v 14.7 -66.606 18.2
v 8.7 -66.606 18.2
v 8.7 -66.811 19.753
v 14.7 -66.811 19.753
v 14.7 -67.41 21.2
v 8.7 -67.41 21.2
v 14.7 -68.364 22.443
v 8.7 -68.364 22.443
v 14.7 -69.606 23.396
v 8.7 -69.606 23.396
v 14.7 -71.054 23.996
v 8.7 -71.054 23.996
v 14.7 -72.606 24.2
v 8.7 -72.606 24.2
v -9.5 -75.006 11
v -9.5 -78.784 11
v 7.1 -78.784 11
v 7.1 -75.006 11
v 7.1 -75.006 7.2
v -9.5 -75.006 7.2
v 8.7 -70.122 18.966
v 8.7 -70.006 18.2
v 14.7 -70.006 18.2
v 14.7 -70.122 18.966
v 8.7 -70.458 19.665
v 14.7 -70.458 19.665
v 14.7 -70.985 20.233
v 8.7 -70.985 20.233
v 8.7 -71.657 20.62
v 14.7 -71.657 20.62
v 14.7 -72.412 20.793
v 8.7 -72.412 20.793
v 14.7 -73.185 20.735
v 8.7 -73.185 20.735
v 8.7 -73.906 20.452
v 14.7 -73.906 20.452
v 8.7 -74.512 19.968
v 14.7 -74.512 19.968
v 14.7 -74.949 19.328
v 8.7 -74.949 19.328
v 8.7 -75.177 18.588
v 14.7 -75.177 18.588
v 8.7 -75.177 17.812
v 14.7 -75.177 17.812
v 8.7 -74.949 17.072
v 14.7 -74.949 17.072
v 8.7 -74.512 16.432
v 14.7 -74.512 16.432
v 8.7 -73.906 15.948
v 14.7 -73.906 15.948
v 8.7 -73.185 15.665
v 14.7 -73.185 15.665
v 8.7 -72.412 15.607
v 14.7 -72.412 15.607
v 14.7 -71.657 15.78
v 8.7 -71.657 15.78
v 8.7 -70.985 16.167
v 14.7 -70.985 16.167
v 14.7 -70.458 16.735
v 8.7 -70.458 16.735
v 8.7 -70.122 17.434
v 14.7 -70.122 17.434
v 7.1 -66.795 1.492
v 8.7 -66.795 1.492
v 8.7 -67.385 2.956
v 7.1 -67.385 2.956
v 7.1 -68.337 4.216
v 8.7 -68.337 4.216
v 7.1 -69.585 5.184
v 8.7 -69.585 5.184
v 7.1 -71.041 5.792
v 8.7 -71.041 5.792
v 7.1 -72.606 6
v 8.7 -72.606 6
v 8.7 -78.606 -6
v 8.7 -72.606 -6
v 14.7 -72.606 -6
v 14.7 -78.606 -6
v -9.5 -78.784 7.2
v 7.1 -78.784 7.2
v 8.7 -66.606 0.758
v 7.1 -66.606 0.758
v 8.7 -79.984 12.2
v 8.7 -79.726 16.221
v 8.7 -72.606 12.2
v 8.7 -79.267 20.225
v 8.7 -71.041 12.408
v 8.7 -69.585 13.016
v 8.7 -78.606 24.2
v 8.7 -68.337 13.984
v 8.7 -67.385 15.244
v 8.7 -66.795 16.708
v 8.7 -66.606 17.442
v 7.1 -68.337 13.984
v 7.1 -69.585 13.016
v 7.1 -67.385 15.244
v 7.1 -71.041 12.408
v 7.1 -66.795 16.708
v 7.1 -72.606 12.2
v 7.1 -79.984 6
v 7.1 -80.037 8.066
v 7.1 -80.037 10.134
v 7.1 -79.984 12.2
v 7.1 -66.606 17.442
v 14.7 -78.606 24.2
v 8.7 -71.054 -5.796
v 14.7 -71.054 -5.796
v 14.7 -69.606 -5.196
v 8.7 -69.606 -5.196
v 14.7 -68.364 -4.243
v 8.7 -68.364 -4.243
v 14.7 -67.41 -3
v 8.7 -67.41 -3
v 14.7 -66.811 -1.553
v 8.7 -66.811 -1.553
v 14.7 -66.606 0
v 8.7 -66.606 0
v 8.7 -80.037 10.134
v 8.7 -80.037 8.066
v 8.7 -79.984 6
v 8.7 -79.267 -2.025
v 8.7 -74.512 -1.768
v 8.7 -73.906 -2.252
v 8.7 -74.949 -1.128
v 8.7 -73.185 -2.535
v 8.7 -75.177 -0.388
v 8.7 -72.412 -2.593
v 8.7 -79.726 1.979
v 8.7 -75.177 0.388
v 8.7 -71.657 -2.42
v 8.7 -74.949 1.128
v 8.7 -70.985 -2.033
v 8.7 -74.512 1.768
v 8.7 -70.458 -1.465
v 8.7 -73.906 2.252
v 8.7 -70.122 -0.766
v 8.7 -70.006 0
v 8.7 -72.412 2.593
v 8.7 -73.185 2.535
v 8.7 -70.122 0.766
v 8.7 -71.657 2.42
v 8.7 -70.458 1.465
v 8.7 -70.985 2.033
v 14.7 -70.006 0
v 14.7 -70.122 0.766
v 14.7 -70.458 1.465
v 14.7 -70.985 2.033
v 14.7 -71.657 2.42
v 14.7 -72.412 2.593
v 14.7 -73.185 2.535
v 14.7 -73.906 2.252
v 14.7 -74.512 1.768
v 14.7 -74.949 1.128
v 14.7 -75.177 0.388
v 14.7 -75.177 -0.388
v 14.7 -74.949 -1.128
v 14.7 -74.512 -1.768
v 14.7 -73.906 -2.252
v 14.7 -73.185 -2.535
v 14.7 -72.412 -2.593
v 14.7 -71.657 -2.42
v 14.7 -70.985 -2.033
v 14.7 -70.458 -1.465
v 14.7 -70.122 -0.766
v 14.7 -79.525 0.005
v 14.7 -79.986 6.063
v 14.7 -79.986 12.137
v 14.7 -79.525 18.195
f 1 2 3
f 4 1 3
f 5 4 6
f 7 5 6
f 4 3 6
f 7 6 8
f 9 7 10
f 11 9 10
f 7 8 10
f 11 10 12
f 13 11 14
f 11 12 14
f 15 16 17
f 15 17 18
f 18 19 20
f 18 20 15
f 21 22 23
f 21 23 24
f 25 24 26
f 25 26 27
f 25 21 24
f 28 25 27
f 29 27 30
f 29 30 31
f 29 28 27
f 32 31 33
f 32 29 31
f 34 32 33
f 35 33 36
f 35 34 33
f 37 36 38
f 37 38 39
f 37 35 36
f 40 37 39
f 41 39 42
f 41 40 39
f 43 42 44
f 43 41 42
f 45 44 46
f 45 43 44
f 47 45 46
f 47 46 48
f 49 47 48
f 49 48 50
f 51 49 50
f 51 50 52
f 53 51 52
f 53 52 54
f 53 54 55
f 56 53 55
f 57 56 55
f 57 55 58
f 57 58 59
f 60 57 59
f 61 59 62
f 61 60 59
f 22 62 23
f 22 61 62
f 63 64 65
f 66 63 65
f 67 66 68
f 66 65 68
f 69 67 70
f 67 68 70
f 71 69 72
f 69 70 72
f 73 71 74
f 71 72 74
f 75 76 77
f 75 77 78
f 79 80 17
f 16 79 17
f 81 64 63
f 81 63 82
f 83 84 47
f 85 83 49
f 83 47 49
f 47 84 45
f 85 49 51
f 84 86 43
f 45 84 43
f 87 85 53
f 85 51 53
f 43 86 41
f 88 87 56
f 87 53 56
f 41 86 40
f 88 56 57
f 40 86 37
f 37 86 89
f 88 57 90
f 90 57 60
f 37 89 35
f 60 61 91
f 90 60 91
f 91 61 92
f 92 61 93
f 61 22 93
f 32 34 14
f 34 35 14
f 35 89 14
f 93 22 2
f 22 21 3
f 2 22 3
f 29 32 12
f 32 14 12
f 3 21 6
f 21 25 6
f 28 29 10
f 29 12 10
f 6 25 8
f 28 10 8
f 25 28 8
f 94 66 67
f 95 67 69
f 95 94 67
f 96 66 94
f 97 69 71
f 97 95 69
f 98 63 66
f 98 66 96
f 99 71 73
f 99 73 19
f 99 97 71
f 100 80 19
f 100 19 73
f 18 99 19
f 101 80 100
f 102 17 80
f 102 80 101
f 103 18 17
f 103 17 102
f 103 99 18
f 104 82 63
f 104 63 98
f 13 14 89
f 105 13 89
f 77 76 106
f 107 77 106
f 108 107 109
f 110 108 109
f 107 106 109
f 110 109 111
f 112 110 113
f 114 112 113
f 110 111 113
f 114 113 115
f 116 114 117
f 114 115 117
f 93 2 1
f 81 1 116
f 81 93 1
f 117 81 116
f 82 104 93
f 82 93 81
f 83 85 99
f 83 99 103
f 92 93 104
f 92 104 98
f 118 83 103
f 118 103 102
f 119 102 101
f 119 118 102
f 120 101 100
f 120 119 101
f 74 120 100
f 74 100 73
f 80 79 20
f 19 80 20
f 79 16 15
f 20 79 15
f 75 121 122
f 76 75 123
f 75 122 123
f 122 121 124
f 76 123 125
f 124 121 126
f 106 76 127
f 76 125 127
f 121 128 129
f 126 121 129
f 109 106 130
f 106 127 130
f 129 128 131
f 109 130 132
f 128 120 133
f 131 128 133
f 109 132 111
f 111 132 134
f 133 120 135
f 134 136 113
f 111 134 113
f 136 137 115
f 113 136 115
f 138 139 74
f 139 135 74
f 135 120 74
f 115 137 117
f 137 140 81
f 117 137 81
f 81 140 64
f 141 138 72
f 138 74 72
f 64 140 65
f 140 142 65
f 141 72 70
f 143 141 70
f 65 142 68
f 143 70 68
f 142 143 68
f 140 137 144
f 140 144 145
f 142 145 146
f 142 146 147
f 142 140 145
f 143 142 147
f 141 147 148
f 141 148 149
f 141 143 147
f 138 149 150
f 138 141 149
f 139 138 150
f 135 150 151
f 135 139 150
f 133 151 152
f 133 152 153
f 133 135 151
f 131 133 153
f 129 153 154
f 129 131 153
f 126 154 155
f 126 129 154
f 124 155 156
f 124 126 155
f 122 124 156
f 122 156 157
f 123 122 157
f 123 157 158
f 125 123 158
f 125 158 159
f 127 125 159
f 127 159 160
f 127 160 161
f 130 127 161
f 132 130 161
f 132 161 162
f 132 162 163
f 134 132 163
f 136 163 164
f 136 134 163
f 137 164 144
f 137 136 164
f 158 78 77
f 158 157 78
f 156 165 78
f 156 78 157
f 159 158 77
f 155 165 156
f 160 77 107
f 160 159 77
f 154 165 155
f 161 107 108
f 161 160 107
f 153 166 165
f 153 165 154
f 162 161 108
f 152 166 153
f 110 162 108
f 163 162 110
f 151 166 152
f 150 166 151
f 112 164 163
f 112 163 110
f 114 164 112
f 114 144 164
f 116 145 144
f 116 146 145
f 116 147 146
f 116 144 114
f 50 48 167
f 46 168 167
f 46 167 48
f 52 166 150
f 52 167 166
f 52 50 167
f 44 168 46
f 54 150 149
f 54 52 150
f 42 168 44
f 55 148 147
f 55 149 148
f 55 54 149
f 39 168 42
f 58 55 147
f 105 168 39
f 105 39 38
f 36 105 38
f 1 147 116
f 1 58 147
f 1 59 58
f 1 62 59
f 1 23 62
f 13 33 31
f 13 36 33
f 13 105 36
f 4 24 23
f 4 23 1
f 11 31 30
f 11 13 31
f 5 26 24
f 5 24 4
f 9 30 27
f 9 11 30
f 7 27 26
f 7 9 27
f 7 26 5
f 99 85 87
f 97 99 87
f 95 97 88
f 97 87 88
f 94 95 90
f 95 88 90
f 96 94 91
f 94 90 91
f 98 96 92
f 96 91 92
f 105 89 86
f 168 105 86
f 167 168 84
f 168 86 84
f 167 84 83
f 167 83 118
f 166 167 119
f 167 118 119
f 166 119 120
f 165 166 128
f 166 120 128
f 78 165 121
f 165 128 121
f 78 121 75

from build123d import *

# Parameters (mm, degrees)
SKETCH001_R  = 2.6
PAD_DEPTH    = 6
PAD001_DEPTH = 1.6
SKETCH003_W  = 3.7771358599
SKETCH003_H  = 3.8
PAD002_DEPTH = 18.2


with BuildPart() as part:
    # Sketch001 → Pad (new body)
    with BuildSketch(Plane.YZ.offset(8.7)):
        with BuildLine():
            ThreePointArc((0, -6), (4.2426406871, -4.2426406871), (6, 0))
            Line((6, 18.2), (6, 0))
            ThreePointArc((6, 18.2), (4.2426406871, 22.4426406871), (0, 24.2))
            Line((0, 24.2), (-6, 24.2))
            ThreePointArc((-6, 24.2), (-7.4371881489, 9.1), (-6, -6))
            Line((0, -6), (-6, -6))
        make_face()
        Circle(SKETCH001_R, mode=Mode.SUBTRACT)
        with Locations((0, 18.2)):
            Circle(SKETCH001_R, mode=Mode.SUBTRACT)
    extrude(amount=PAD_DEPTH)

    # Sketch002 → Pad001 (join)
    with BuildSketch(Plane.YZ.offset(8.7)):
        with BuildLine():
            ThreePointArc((0, 12.2), (3.6774423219, 13.4590699257), (5.8114989668, 16.707860677))
            Line((6, 17.4420237293), (5.8114989668, 16.707860677))
            Line((6, 0.7579762707), (6, 17.4420237293))
            Line((5.8114989668, 1.492139323), (6, 0.7579762707))
            ThreePointArc((5.8114989668, 1.492139323), (3.6774423219, 4.7409300743), (0, 6))
            Line((-7.3771358599, 6), (0, 6))
            ThreePointArc((-7.3771358599, 12.2), (-7.4371881489, 9.1), (-7.3771358599, 6))
            Line((0, 12.2), (-7.3771358599, 12.2))
        make_face()
    extrude(amount=-PAD001_DEPTH)

    # Sketch003 → Pad002 (join)
    with BuildSketch(Plane.YZ.offset(8.7)):
        with Locations((-4.2885679299, 9.1)):
            Rectangle(SKETCH003_W, SKETCH003_H)
    extrude(amount=-PAD002_DEPTH)


with BuildPart() as part_1:
    # Body004 placement: moved
    add(part.part.moved(Location((0, -72.6064407756, 0))))


solid = part_1.part
